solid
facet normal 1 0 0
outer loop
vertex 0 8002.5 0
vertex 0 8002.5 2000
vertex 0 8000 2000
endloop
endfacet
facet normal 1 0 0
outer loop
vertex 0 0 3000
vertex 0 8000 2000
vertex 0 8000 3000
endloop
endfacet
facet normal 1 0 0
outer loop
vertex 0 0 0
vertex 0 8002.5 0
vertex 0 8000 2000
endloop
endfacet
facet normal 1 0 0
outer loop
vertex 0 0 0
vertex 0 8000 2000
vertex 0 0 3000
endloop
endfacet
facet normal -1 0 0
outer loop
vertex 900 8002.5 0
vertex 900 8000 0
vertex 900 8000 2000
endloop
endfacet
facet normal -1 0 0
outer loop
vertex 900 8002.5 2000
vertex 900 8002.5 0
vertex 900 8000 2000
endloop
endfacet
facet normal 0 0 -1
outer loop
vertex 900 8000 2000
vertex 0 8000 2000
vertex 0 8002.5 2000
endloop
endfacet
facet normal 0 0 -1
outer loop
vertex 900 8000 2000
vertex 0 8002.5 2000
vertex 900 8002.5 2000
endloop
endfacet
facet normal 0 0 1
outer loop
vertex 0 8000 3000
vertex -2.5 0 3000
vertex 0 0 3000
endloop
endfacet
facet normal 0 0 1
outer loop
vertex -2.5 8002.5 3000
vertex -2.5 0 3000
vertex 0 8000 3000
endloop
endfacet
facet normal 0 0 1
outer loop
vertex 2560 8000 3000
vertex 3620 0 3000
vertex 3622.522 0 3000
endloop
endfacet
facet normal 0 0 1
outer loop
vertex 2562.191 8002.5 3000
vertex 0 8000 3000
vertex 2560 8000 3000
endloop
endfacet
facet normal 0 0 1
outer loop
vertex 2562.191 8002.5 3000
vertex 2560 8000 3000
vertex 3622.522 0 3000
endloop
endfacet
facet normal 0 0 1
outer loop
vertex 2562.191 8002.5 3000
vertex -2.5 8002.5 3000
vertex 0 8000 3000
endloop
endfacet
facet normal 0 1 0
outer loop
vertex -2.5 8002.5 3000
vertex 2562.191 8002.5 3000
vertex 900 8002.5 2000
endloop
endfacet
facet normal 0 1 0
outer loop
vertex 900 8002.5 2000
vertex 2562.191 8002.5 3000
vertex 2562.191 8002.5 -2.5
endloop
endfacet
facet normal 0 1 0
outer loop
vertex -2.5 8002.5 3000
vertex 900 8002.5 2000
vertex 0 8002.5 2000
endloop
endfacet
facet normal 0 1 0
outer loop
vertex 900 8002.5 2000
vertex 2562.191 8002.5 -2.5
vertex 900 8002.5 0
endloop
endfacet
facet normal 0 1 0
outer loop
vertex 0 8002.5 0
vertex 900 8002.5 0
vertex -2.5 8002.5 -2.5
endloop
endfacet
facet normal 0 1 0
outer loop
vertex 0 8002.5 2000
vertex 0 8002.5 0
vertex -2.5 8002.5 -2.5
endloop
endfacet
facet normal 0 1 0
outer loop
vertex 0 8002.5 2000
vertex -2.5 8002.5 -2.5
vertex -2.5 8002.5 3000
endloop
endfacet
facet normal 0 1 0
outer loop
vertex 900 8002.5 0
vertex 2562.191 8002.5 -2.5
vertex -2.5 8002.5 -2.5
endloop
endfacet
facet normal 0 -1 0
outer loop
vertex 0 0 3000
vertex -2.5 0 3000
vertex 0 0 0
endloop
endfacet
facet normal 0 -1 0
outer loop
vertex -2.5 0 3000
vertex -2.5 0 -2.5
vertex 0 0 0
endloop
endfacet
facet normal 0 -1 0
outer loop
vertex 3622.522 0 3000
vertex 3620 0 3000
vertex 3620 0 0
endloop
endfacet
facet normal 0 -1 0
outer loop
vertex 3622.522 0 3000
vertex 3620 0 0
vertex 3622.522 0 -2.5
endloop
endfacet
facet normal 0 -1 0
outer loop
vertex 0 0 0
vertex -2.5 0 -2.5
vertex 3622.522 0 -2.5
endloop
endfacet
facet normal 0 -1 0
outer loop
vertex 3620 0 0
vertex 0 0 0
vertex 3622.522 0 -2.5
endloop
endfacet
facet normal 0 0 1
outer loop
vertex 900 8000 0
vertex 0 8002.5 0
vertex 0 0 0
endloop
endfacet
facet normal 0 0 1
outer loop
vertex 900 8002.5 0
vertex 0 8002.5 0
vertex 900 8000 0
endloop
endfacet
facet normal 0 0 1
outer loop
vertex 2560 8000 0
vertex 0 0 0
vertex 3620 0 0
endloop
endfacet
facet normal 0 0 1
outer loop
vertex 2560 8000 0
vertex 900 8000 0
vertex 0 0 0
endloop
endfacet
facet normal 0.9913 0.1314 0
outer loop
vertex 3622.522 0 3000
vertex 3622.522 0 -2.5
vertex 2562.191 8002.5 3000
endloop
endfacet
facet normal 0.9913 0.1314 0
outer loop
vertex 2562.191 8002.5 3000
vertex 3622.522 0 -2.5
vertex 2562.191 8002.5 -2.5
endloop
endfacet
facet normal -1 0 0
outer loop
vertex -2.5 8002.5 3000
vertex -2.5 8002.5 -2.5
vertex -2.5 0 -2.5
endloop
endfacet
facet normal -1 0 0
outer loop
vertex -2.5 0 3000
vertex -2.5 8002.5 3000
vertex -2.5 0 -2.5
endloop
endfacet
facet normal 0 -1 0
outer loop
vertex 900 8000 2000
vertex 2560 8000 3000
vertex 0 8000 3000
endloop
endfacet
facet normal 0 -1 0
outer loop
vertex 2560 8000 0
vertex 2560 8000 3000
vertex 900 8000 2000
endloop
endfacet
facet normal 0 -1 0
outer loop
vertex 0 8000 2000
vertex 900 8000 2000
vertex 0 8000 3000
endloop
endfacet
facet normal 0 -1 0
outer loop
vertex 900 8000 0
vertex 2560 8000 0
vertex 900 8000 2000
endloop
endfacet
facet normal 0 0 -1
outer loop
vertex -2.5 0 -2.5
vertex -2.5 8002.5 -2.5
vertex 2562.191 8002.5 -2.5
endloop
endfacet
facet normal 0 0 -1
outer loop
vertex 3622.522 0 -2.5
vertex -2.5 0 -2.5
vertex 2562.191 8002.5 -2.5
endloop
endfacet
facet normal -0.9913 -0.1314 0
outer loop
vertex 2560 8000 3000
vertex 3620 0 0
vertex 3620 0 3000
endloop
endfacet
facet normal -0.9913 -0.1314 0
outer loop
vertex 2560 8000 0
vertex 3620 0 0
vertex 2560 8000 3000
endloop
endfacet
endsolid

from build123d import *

# Parameters (mm, degrees)
F1_DEPTH = 3000
F2_T     = 2.5
F3_W     = 900
F3_H     = 2000
F4_DEPTH = 25


with BuildPart() as f1:
    # F0 (on Top) → F1 (new body)
    with BuildSketch(Plane.XY):
        Polygon((0, 8000), (0, 0), (3620, 0), (2560, 8000), align=None)
    extrude(amount=F1_DEPTH)

    # F2
    f2_openings = [f1.faces().sort_by_distance(p)[0] for p in [
        (1560.151025, 3771.305286, 3000),
        (1810, 0, 1500),
    ]]
    offset(amount=F2_T, openings=f2_openings, kind=Kind.INTERSECTION)

    # F3 (on face) → F4 (cut)
    with BuildSketch(Plane.XZ.offset(-8000)):
        with Locations((450, 1000)):
            Rectangle(F3_W, F3_H)
    extrude(amount=-F4_DEPTH, mode=Mode.SUBTRACT)


solid = f1.part
